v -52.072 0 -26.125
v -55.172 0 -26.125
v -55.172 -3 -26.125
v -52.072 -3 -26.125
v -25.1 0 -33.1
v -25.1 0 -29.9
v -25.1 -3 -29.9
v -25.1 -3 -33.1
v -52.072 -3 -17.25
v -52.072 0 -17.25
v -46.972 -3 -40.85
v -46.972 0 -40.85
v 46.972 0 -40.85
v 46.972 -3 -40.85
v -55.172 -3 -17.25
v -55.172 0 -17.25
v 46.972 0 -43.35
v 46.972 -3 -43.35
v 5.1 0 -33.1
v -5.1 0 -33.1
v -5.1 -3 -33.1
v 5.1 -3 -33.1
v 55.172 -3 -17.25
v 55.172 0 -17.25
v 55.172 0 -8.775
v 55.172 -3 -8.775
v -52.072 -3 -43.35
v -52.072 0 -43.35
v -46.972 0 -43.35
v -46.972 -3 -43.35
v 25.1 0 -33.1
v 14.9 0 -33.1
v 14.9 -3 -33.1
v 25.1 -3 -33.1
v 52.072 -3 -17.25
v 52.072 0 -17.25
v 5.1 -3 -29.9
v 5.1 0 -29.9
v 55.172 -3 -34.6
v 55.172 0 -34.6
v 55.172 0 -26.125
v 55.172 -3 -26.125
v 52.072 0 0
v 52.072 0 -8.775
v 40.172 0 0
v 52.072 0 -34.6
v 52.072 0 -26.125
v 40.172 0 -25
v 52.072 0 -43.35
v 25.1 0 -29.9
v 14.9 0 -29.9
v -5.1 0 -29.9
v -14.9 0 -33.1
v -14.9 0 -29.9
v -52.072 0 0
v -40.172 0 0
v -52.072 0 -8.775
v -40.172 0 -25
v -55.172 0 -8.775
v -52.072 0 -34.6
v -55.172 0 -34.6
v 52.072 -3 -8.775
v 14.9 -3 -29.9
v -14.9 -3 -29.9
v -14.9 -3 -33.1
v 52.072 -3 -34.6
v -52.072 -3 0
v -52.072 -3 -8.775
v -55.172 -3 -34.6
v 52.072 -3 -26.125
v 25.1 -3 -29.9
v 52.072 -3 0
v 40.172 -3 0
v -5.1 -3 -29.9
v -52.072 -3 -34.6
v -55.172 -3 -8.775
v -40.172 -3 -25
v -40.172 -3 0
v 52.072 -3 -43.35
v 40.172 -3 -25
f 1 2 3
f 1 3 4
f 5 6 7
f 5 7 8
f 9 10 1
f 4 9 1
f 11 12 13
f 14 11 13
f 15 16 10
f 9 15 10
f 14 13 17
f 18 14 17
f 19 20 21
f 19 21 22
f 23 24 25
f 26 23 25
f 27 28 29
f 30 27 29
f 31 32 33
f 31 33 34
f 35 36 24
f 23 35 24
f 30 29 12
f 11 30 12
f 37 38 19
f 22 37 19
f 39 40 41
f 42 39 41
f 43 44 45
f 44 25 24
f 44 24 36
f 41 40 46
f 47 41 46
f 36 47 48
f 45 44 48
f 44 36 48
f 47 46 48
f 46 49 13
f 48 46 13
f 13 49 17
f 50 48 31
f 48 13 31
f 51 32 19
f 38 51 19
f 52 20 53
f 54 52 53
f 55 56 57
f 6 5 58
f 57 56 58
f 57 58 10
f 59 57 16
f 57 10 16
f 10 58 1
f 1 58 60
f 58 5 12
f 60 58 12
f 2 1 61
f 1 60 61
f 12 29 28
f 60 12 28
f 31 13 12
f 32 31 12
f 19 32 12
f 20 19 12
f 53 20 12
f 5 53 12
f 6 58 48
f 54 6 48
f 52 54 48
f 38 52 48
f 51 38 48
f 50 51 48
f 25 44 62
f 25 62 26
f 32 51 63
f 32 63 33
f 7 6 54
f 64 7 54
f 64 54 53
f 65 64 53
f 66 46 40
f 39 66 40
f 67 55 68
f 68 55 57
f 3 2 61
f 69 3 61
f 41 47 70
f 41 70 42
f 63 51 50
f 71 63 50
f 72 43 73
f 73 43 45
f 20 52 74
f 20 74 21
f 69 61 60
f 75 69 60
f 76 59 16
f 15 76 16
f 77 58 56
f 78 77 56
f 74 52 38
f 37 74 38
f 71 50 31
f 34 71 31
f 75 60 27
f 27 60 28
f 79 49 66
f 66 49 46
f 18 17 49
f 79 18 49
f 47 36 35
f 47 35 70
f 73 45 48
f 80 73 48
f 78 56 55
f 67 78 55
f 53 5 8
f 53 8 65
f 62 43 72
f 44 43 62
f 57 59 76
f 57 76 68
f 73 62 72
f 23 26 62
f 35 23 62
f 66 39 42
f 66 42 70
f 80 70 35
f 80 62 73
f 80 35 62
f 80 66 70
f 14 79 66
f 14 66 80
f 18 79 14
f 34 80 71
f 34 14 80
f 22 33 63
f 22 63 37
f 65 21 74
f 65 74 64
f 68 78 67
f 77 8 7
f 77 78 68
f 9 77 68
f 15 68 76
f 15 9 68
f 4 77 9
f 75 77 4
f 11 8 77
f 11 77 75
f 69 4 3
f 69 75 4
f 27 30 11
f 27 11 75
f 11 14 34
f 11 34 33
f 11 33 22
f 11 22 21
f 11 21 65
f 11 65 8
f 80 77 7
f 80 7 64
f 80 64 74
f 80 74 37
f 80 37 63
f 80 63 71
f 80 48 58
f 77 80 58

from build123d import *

# Parameters (mm, degrees)
BOSS_EXTRUDE1_DEPTH = 3
SKETCH2_W           = 3.2
SKETCH2_H           = 8.875
SKETCH2_W_2         = 10.2
SKETCH2_H_2         = 3.2
CUT_EXTRUDE1_DEPTH  = 4


with BuildPart() as part:
    # Sketch1 → Boss-Extrude1 (new body)
    with BuildSketch(Plane(origin=(0, 0, 0), x_dir=(1, 0, 0), z_dir=(0, 1, 0))):
        Polygon((-40.172217102, 0), (-55.172217102, 0), (-55.172217102, 43.95), (55.172217102, 43.95), (55.172217102, 0), (40.172217102, 0), (40.172217102, 25), (-40.172217102, 25), align=None)
    extrude(amount=-BOSS_EXTRUDE1_DEPTH)

    # Sketch2 → Cut-Extrude1 (cut, through all)
    with BuildSketch(Plane(origin=(0, 0, 0), x_dir=(1, 0, 0), z_dir=(0, 1, 0))):
        Polygon((-46.972217102, 40.85), (46.972217102, 40.85), (46.972217102, 43.35), (52.072217102, 43.35), (52.072217102, 34.6), (55.272217102, 34.6), (55.272217102, 44.05), (-55.272217102, 44.05), (-55.272217102, 34.6), (-52.072217102, 34.6), (-52.072217102, 43.35), (-46.972217102, 43.35), align=None)
        with Locations((-53.672217102, 21.6875)):
            Rectangle(SKETCH2_W, SKETCH2_H)
        with Locations((-53.672217102, 4.3375)):
            Rectangle(SKETCH2_W, SKETCH2_H)
        with Locations((53.672217102, 4.3375)):
            Rectangle(SKETCH2_W, SKETCH2_H)
        with Locations((53.672217102, 21.6875)):
            Rectangle(SKETCH2_W, SKETCH2_H)
        with Locations((-20, 31.5)):
            Rectangle(SKETCH2_W_2, SKETCH2_H_2)
        with Locations((20, 31.5)):
            Rectangle(SKETCH2_W_2, SKETCH2_H_2)
        with Locations((0, 31.5)):
            Rectangle(SKETCH2_W_2, SKETCH2_H_2)
    extrude(amount=-CUT_EXTRUDE1_DEPTH, mode=Mode.SUBTRACT)


solid = part.part
